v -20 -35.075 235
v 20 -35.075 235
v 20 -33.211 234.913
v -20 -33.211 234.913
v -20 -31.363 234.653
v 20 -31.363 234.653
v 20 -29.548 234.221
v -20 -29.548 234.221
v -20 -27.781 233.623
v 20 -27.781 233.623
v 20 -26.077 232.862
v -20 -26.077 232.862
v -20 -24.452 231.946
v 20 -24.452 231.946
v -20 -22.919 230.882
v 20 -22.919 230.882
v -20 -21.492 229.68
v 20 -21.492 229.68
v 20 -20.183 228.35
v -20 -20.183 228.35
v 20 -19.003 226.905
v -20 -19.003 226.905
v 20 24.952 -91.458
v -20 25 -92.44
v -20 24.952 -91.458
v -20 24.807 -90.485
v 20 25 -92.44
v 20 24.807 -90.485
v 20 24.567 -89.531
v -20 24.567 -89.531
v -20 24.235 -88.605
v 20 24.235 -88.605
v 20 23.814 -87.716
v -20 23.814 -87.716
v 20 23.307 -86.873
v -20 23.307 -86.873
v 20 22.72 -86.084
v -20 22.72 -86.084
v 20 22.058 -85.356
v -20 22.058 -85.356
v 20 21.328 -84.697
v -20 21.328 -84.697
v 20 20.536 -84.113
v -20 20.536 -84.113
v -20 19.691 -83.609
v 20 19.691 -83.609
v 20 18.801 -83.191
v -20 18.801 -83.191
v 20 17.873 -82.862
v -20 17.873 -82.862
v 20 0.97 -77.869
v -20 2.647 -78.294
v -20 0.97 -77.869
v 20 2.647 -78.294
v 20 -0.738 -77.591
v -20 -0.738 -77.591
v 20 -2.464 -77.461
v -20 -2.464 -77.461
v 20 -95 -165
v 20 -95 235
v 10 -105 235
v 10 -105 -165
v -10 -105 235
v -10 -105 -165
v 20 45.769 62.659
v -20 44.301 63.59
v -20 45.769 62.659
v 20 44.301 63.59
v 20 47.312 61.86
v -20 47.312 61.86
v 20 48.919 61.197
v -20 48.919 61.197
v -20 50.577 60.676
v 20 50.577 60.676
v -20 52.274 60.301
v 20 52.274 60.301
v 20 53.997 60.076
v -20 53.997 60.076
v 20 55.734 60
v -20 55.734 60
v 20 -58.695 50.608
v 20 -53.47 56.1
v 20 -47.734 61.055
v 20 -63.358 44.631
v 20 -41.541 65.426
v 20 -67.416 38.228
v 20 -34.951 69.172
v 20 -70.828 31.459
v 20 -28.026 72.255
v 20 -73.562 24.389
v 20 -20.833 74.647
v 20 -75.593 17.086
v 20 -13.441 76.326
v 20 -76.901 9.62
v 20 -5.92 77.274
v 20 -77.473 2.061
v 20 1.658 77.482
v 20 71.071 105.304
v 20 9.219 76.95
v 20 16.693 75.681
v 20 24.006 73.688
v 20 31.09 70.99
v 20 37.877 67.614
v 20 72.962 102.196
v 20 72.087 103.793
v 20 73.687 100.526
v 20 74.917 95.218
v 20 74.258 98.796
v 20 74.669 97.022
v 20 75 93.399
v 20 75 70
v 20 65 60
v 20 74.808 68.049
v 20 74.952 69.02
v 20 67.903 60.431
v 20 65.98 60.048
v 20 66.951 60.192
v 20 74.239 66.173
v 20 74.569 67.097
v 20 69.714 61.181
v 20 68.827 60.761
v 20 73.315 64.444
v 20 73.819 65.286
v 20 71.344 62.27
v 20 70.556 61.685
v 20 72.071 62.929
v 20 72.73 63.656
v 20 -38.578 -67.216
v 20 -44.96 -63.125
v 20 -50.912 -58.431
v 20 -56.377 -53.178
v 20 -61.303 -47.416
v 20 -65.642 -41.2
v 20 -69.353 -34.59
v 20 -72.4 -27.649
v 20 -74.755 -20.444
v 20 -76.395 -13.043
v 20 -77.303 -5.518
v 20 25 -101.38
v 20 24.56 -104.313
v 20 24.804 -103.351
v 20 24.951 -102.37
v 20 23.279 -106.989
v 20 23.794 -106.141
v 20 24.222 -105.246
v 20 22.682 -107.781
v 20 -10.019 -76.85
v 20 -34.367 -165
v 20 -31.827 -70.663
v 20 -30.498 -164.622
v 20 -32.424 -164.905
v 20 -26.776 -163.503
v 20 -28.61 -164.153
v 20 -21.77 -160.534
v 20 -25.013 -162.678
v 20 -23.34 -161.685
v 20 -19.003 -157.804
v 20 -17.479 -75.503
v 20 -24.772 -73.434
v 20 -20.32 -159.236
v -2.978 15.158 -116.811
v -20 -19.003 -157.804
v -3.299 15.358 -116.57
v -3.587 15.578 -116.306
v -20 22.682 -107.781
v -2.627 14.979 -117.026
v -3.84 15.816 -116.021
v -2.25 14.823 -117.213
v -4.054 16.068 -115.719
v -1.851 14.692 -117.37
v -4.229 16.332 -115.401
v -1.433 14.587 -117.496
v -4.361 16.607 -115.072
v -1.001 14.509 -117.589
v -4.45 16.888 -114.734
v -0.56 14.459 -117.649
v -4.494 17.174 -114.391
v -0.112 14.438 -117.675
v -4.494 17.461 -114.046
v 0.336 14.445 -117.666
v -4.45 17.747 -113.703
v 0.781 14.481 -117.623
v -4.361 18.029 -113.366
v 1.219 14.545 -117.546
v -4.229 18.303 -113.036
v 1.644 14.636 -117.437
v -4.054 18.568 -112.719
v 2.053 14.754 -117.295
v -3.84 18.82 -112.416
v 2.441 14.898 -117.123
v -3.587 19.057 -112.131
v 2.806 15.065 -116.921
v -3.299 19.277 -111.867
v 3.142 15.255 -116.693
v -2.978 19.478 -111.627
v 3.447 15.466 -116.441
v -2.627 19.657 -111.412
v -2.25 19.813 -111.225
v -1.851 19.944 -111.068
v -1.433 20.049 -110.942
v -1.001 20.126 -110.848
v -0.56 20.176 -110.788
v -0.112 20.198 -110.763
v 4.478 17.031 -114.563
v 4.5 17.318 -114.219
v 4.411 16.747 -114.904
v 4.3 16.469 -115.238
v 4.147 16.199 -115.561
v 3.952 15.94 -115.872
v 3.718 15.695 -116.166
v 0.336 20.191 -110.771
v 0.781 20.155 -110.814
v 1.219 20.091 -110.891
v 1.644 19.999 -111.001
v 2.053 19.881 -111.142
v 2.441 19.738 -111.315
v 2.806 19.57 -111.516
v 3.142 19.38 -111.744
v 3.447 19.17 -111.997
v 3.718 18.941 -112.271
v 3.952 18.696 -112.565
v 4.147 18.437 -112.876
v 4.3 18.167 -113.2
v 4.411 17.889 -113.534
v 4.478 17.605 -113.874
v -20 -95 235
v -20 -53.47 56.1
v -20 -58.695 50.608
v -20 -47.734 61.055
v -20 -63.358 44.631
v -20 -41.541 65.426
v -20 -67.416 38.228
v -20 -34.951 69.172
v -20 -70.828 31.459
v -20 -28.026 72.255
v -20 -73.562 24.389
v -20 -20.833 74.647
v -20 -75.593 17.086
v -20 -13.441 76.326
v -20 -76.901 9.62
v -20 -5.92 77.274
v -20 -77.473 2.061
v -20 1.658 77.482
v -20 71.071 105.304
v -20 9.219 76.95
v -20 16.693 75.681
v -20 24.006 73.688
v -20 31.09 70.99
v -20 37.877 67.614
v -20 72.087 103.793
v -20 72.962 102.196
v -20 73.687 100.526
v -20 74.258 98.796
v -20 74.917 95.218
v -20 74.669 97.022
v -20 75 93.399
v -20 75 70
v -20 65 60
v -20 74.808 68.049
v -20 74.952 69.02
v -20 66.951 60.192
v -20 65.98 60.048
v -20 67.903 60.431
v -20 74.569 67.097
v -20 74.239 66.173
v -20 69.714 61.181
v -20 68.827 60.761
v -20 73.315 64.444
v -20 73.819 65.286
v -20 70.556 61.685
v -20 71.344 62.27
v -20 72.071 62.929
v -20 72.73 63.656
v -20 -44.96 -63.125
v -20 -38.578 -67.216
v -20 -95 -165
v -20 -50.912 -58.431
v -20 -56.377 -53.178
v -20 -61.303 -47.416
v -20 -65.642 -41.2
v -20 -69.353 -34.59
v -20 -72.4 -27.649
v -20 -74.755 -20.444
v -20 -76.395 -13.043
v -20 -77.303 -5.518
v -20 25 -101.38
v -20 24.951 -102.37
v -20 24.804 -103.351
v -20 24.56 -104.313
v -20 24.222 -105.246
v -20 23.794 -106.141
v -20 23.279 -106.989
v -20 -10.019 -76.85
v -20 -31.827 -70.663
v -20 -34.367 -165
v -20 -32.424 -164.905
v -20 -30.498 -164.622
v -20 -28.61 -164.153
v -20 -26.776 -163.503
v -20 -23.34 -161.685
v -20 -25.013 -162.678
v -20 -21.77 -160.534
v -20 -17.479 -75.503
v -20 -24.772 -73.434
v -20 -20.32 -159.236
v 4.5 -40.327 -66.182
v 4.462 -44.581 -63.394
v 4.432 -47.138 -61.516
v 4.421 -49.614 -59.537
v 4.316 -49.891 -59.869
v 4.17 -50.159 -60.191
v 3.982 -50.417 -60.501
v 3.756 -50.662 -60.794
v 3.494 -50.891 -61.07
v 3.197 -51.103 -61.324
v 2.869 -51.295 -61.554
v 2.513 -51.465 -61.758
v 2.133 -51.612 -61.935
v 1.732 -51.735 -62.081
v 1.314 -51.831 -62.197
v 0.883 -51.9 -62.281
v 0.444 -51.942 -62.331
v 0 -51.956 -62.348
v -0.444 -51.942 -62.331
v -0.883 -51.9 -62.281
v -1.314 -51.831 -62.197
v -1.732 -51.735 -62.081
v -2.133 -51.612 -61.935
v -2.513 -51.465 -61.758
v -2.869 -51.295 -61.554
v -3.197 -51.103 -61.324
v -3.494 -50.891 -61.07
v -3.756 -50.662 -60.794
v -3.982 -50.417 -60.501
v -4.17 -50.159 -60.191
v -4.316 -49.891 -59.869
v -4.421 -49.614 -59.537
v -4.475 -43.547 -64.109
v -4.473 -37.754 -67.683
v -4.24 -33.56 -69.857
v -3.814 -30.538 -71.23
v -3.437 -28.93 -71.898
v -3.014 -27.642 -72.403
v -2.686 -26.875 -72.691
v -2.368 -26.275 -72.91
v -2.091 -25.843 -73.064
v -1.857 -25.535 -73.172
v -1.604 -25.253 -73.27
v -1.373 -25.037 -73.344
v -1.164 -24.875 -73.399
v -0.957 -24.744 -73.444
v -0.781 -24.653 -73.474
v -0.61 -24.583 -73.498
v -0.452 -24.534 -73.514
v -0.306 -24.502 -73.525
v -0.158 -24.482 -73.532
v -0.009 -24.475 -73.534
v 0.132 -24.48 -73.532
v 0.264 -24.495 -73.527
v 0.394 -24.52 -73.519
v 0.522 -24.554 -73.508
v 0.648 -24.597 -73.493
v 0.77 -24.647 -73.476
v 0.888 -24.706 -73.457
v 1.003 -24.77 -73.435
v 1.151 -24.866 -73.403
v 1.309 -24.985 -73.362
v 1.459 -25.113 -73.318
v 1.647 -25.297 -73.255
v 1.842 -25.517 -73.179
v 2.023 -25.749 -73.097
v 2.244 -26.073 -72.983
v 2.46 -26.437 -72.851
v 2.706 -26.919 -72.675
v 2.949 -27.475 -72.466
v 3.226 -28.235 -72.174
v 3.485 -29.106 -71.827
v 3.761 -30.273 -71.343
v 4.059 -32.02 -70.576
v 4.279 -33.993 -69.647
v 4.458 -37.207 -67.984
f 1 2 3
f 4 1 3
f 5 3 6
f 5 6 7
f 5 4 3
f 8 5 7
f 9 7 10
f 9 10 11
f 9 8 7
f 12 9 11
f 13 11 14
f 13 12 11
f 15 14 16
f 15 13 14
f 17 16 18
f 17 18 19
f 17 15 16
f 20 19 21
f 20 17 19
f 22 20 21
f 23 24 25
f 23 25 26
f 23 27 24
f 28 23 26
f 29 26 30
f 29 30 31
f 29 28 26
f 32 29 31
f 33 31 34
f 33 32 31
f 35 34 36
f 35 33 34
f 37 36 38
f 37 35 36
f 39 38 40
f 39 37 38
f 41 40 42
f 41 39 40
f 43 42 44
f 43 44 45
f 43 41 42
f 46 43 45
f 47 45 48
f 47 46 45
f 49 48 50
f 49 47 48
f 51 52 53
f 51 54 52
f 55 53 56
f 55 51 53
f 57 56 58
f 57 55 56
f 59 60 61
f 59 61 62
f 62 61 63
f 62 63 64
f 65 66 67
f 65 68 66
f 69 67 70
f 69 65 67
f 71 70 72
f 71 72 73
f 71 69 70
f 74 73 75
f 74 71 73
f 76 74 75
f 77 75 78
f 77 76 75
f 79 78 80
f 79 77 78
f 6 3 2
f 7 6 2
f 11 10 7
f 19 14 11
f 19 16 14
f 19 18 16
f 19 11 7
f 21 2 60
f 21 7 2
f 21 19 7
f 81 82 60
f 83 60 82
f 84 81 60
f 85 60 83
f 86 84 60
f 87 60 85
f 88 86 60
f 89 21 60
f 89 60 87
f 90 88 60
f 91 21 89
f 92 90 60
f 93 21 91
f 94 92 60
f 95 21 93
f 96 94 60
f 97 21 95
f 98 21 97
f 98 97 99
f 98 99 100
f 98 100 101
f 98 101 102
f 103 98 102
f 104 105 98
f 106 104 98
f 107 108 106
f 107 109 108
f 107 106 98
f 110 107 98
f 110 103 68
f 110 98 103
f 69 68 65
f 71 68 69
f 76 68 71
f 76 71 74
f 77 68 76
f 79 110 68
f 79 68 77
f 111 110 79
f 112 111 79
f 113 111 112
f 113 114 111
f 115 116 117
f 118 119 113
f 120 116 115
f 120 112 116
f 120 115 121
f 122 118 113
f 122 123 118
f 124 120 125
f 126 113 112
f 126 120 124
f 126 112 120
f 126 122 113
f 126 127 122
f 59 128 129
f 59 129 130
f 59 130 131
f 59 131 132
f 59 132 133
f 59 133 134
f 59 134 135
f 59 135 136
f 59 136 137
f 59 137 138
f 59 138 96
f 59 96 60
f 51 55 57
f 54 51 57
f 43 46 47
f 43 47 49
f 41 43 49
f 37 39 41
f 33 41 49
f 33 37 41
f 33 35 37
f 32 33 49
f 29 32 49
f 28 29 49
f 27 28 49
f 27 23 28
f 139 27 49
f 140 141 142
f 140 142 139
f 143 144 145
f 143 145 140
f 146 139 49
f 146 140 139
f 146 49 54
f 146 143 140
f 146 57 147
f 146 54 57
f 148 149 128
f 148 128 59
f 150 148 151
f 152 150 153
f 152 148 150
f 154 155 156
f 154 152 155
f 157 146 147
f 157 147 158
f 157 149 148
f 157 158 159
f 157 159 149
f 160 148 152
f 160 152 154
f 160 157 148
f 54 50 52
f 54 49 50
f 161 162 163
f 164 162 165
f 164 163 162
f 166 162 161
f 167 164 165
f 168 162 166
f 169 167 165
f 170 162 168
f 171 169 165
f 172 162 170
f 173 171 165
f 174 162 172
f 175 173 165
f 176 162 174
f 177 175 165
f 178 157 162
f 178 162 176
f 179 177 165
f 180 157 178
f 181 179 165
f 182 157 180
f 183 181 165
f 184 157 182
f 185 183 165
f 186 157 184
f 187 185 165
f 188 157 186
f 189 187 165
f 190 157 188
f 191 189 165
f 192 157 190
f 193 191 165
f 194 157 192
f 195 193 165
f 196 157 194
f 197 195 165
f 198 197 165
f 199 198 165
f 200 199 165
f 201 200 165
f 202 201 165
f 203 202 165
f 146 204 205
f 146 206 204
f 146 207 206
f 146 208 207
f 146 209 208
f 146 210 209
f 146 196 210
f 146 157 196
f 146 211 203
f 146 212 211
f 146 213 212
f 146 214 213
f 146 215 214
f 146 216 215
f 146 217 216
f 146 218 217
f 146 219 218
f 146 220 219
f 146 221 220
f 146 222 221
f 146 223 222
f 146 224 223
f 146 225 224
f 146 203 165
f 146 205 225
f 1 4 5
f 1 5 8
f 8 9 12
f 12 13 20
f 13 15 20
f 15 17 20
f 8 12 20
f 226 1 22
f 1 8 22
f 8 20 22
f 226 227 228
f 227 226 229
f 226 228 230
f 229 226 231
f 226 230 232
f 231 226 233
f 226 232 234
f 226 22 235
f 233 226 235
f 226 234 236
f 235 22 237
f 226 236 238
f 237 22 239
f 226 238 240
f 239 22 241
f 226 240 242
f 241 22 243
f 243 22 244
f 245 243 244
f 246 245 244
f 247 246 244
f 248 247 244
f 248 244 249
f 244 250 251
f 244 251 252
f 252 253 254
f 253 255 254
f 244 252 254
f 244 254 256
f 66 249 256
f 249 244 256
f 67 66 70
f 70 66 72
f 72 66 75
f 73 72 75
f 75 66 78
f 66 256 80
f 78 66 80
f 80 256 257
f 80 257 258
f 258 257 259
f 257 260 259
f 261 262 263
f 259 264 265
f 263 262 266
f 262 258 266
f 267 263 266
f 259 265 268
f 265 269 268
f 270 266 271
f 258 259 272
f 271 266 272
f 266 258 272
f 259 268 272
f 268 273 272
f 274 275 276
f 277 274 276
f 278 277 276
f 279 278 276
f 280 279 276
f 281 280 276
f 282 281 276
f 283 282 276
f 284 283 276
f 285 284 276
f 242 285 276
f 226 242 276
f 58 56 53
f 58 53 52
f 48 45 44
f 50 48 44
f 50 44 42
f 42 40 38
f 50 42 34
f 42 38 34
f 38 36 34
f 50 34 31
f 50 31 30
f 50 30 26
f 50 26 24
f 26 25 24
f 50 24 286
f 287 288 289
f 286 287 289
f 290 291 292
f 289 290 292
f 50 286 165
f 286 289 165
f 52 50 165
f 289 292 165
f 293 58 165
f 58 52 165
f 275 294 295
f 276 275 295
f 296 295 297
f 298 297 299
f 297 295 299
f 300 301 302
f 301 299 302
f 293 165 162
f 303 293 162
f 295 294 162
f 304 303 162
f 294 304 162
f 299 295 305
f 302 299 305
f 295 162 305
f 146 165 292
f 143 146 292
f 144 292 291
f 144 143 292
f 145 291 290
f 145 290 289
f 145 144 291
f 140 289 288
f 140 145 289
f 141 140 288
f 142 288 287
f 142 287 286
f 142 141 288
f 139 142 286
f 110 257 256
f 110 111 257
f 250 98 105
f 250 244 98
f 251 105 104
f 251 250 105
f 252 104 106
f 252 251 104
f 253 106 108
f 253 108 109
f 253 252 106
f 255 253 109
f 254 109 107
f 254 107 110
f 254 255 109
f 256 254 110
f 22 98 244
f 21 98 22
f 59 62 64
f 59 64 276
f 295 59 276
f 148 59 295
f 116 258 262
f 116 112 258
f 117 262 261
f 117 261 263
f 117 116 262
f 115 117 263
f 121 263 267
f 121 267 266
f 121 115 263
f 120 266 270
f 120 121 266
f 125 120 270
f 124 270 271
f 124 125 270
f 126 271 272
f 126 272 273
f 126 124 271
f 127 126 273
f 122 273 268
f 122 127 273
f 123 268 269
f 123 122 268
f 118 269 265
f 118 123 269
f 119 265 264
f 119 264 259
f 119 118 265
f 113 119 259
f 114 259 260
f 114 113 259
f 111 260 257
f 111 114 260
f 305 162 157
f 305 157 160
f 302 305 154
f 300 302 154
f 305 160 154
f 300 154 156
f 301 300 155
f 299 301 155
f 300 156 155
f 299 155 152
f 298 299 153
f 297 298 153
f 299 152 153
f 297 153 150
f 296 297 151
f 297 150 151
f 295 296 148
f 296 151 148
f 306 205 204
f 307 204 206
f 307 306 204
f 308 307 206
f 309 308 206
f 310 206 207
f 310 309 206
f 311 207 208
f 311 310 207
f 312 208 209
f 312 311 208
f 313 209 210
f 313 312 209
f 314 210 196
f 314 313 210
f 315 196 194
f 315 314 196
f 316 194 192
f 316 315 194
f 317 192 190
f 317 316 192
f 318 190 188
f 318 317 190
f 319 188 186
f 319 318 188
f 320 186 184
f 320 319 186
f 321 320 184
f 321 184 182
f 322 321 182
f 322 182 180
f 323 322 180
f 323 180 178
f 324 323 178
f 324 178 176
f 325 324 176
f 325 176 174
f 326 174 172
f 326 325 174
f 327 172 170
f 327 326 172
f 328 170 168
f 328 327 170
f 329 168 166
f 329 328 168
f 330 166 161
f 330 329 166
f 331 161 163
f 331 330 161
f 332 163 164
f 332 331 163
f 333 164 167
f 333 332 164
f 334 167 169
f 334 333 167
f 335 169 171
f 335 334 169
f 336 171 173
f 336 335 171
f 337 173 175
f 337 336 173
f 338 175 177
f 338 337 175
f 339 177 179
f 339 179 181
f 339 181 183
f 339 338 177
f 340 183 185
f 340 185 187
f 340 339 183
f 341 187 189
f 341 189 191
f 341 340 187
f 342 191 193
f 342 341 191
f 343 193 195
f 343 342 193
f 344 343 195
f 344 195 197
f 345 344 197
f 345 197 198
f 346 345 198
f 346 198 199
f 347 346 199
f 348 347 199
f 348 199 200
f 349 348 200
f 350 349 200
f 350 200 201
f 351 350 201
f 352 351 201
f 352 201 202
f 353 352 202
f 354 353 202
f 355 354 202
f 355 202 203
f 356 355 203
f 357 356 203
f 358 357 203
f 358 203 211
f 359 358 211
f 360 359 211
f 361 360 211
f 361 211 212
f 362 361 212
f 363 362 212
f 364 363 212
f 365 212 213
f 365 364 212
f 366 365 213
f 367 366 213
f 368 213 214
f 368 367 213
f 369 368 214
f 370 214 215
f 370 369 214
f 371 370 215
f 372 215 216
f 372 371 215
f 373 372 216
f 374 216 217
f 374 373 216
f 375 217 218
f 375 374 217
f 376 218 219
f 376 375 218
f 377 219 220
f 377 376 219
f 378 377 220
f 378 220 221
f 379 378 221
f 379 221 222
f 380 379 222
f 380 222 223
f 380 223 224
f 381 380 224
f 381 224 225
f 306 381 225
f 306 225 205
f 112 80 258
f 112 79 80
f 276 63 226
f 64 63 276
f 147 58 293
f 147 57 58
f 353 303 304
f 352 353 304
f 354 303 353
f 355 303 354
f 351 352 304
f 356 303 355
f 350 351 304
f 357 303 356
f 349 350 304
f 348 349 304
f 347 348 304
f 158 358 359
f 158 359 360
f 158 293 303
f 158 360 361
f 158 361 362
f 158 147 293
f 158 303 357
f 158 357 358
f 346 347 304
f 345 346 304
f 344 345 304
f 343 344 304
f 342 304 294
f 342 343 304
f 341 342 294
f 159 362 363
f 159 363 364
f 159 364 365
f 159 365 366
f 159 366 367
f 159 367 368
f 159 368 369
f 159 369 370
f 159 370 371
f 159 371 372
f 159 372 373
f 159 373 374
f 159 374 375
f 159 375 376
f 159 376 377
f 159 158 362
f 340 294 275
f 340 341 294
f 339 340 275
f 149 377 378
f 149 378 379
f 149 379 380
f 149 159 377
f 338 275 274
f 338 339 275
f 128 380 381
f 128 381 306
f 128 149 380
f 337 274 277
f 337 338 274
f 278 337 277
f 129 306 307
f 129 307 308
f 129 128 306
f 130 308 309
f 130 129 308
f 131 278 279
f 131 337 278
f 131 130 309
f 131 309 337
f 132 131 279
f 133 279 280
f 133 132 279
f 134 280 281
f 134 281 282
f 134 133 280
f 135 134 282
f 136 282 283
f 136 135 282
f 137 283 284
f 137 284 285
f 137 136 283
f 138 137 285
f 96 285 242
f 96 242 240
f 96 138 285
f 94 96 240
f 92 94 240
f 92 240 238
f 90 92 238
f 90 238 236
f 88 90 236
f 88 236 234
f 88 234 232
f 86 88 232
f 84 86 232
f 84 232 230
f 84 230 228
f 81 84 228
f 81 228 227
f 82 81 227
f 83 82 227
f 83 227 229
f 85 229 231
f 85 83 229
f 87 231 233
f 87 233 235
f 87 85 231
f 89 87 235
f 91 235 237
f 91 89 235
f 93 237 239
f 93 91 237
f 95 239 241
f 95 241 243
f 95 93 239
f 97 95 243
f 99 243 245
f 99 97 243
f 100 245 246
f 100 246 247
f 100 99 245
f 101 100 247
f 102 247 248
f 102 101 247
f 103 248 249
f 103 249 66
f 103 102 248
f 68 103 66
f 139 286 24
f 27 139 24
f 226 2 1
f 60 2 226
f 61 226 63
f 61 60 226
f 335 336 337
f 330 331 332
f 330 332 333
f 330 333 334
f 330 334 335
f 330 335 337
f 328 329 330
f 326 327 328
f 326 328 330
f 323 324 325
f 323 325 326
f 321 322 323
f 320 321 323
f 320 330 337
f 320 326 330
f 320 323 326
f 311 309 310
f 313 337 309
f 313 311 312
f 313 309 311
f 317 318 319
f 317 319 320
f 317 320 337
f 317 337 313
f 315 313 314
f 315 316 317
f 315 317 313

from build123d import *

# Parameters (mm, degrees)
EXTRUDE_1_DEPTH     = 20
M10X1_0_1_OUTLINE_R = 4.5
M10X1_0_1_DEPTH     = 86.424893955
FILLET_1_R          = 10
FILLET_2_R          = 20
CHAMFER_1_SIZE      = 10


# Read off the part's stored shape, not the designer's step: M10x1.0 螺纹孔1
with BuildPart() as part:
    # 草图1 → 凸台-拉伸1 (new, symmetric)
    with BuildSketch(Plane(origin=(0, 0, 0), x_dir=(0, 0, -1), z_dir=(1, 0, 0))):
        with BuildLine():
            Line((-235, -105), (165, -105))
            Line((165, -105), (165, -25))
            Line((165, -25), (105, 25))
            Line((105, 25), (85, 25))
            Line((85, 25), (77.5, 0))
            ThreePointArc((77.5, 0), (-26.04083332, -72.994006603), (-60, 49.053542176))
            Line((-60, 49.053542176), (-60, 75))
            Line((-60, 75), (-100, 75))
            Line((-100, 75), (-235, -25))
            Line((-235, -25), (-235, -105))
        make_face()
    extrude(amount=EXTRUDE_1_DEPTH, both=True)

    # M10x1.0 螺纹孔1 outline → M10x1.0 螺纹孔1 (cut)
    with BuildSketch(Plane(origin=(0, 0, 0), x_dir=(1, 0, 0), z_dir=(0, 0.7682212795973757, -0.6401843996644799))):
        with Locations((0, 76.658624366)):
            Circle(M10X1_0_1_OUTLINE_R)
    extrude(amount=M10X1_0_1_DEPTH, mode=Mode.SUBTRACT)

    # 圆角1
    fillet_1_edges = [part.edges().sort_by_distance(p)[0] for p in [
        (0, 75, 60),
        (0, 25, -85),
        (0, 25, -105),
    ]]
    fillet(fillet_1_edges, radius=FILLET_1_R)

    # 圆角2
    fillet_2_edges = [part.edges().sort_by_distance(p)[0] for p in [
        (0, -25, 235),
        (0, 75, 100),
        (0, 49.053542176, 60),
        (0, 0, -77.5),
        (0, -25, -165),
    ]]
    fillet(fillet_2_edges, radius=FILLET_2_R)

    # 倒角1
    chamfer_1_edges = [part.edges().sort_by_distance(p)[0] for p in [
        (-20, -105, 35),
        (20, -105, 35),
    ]]
    chamfer(chamfer_1_edges, length=CHAMFER_1_SIZE)


solid = part.part
